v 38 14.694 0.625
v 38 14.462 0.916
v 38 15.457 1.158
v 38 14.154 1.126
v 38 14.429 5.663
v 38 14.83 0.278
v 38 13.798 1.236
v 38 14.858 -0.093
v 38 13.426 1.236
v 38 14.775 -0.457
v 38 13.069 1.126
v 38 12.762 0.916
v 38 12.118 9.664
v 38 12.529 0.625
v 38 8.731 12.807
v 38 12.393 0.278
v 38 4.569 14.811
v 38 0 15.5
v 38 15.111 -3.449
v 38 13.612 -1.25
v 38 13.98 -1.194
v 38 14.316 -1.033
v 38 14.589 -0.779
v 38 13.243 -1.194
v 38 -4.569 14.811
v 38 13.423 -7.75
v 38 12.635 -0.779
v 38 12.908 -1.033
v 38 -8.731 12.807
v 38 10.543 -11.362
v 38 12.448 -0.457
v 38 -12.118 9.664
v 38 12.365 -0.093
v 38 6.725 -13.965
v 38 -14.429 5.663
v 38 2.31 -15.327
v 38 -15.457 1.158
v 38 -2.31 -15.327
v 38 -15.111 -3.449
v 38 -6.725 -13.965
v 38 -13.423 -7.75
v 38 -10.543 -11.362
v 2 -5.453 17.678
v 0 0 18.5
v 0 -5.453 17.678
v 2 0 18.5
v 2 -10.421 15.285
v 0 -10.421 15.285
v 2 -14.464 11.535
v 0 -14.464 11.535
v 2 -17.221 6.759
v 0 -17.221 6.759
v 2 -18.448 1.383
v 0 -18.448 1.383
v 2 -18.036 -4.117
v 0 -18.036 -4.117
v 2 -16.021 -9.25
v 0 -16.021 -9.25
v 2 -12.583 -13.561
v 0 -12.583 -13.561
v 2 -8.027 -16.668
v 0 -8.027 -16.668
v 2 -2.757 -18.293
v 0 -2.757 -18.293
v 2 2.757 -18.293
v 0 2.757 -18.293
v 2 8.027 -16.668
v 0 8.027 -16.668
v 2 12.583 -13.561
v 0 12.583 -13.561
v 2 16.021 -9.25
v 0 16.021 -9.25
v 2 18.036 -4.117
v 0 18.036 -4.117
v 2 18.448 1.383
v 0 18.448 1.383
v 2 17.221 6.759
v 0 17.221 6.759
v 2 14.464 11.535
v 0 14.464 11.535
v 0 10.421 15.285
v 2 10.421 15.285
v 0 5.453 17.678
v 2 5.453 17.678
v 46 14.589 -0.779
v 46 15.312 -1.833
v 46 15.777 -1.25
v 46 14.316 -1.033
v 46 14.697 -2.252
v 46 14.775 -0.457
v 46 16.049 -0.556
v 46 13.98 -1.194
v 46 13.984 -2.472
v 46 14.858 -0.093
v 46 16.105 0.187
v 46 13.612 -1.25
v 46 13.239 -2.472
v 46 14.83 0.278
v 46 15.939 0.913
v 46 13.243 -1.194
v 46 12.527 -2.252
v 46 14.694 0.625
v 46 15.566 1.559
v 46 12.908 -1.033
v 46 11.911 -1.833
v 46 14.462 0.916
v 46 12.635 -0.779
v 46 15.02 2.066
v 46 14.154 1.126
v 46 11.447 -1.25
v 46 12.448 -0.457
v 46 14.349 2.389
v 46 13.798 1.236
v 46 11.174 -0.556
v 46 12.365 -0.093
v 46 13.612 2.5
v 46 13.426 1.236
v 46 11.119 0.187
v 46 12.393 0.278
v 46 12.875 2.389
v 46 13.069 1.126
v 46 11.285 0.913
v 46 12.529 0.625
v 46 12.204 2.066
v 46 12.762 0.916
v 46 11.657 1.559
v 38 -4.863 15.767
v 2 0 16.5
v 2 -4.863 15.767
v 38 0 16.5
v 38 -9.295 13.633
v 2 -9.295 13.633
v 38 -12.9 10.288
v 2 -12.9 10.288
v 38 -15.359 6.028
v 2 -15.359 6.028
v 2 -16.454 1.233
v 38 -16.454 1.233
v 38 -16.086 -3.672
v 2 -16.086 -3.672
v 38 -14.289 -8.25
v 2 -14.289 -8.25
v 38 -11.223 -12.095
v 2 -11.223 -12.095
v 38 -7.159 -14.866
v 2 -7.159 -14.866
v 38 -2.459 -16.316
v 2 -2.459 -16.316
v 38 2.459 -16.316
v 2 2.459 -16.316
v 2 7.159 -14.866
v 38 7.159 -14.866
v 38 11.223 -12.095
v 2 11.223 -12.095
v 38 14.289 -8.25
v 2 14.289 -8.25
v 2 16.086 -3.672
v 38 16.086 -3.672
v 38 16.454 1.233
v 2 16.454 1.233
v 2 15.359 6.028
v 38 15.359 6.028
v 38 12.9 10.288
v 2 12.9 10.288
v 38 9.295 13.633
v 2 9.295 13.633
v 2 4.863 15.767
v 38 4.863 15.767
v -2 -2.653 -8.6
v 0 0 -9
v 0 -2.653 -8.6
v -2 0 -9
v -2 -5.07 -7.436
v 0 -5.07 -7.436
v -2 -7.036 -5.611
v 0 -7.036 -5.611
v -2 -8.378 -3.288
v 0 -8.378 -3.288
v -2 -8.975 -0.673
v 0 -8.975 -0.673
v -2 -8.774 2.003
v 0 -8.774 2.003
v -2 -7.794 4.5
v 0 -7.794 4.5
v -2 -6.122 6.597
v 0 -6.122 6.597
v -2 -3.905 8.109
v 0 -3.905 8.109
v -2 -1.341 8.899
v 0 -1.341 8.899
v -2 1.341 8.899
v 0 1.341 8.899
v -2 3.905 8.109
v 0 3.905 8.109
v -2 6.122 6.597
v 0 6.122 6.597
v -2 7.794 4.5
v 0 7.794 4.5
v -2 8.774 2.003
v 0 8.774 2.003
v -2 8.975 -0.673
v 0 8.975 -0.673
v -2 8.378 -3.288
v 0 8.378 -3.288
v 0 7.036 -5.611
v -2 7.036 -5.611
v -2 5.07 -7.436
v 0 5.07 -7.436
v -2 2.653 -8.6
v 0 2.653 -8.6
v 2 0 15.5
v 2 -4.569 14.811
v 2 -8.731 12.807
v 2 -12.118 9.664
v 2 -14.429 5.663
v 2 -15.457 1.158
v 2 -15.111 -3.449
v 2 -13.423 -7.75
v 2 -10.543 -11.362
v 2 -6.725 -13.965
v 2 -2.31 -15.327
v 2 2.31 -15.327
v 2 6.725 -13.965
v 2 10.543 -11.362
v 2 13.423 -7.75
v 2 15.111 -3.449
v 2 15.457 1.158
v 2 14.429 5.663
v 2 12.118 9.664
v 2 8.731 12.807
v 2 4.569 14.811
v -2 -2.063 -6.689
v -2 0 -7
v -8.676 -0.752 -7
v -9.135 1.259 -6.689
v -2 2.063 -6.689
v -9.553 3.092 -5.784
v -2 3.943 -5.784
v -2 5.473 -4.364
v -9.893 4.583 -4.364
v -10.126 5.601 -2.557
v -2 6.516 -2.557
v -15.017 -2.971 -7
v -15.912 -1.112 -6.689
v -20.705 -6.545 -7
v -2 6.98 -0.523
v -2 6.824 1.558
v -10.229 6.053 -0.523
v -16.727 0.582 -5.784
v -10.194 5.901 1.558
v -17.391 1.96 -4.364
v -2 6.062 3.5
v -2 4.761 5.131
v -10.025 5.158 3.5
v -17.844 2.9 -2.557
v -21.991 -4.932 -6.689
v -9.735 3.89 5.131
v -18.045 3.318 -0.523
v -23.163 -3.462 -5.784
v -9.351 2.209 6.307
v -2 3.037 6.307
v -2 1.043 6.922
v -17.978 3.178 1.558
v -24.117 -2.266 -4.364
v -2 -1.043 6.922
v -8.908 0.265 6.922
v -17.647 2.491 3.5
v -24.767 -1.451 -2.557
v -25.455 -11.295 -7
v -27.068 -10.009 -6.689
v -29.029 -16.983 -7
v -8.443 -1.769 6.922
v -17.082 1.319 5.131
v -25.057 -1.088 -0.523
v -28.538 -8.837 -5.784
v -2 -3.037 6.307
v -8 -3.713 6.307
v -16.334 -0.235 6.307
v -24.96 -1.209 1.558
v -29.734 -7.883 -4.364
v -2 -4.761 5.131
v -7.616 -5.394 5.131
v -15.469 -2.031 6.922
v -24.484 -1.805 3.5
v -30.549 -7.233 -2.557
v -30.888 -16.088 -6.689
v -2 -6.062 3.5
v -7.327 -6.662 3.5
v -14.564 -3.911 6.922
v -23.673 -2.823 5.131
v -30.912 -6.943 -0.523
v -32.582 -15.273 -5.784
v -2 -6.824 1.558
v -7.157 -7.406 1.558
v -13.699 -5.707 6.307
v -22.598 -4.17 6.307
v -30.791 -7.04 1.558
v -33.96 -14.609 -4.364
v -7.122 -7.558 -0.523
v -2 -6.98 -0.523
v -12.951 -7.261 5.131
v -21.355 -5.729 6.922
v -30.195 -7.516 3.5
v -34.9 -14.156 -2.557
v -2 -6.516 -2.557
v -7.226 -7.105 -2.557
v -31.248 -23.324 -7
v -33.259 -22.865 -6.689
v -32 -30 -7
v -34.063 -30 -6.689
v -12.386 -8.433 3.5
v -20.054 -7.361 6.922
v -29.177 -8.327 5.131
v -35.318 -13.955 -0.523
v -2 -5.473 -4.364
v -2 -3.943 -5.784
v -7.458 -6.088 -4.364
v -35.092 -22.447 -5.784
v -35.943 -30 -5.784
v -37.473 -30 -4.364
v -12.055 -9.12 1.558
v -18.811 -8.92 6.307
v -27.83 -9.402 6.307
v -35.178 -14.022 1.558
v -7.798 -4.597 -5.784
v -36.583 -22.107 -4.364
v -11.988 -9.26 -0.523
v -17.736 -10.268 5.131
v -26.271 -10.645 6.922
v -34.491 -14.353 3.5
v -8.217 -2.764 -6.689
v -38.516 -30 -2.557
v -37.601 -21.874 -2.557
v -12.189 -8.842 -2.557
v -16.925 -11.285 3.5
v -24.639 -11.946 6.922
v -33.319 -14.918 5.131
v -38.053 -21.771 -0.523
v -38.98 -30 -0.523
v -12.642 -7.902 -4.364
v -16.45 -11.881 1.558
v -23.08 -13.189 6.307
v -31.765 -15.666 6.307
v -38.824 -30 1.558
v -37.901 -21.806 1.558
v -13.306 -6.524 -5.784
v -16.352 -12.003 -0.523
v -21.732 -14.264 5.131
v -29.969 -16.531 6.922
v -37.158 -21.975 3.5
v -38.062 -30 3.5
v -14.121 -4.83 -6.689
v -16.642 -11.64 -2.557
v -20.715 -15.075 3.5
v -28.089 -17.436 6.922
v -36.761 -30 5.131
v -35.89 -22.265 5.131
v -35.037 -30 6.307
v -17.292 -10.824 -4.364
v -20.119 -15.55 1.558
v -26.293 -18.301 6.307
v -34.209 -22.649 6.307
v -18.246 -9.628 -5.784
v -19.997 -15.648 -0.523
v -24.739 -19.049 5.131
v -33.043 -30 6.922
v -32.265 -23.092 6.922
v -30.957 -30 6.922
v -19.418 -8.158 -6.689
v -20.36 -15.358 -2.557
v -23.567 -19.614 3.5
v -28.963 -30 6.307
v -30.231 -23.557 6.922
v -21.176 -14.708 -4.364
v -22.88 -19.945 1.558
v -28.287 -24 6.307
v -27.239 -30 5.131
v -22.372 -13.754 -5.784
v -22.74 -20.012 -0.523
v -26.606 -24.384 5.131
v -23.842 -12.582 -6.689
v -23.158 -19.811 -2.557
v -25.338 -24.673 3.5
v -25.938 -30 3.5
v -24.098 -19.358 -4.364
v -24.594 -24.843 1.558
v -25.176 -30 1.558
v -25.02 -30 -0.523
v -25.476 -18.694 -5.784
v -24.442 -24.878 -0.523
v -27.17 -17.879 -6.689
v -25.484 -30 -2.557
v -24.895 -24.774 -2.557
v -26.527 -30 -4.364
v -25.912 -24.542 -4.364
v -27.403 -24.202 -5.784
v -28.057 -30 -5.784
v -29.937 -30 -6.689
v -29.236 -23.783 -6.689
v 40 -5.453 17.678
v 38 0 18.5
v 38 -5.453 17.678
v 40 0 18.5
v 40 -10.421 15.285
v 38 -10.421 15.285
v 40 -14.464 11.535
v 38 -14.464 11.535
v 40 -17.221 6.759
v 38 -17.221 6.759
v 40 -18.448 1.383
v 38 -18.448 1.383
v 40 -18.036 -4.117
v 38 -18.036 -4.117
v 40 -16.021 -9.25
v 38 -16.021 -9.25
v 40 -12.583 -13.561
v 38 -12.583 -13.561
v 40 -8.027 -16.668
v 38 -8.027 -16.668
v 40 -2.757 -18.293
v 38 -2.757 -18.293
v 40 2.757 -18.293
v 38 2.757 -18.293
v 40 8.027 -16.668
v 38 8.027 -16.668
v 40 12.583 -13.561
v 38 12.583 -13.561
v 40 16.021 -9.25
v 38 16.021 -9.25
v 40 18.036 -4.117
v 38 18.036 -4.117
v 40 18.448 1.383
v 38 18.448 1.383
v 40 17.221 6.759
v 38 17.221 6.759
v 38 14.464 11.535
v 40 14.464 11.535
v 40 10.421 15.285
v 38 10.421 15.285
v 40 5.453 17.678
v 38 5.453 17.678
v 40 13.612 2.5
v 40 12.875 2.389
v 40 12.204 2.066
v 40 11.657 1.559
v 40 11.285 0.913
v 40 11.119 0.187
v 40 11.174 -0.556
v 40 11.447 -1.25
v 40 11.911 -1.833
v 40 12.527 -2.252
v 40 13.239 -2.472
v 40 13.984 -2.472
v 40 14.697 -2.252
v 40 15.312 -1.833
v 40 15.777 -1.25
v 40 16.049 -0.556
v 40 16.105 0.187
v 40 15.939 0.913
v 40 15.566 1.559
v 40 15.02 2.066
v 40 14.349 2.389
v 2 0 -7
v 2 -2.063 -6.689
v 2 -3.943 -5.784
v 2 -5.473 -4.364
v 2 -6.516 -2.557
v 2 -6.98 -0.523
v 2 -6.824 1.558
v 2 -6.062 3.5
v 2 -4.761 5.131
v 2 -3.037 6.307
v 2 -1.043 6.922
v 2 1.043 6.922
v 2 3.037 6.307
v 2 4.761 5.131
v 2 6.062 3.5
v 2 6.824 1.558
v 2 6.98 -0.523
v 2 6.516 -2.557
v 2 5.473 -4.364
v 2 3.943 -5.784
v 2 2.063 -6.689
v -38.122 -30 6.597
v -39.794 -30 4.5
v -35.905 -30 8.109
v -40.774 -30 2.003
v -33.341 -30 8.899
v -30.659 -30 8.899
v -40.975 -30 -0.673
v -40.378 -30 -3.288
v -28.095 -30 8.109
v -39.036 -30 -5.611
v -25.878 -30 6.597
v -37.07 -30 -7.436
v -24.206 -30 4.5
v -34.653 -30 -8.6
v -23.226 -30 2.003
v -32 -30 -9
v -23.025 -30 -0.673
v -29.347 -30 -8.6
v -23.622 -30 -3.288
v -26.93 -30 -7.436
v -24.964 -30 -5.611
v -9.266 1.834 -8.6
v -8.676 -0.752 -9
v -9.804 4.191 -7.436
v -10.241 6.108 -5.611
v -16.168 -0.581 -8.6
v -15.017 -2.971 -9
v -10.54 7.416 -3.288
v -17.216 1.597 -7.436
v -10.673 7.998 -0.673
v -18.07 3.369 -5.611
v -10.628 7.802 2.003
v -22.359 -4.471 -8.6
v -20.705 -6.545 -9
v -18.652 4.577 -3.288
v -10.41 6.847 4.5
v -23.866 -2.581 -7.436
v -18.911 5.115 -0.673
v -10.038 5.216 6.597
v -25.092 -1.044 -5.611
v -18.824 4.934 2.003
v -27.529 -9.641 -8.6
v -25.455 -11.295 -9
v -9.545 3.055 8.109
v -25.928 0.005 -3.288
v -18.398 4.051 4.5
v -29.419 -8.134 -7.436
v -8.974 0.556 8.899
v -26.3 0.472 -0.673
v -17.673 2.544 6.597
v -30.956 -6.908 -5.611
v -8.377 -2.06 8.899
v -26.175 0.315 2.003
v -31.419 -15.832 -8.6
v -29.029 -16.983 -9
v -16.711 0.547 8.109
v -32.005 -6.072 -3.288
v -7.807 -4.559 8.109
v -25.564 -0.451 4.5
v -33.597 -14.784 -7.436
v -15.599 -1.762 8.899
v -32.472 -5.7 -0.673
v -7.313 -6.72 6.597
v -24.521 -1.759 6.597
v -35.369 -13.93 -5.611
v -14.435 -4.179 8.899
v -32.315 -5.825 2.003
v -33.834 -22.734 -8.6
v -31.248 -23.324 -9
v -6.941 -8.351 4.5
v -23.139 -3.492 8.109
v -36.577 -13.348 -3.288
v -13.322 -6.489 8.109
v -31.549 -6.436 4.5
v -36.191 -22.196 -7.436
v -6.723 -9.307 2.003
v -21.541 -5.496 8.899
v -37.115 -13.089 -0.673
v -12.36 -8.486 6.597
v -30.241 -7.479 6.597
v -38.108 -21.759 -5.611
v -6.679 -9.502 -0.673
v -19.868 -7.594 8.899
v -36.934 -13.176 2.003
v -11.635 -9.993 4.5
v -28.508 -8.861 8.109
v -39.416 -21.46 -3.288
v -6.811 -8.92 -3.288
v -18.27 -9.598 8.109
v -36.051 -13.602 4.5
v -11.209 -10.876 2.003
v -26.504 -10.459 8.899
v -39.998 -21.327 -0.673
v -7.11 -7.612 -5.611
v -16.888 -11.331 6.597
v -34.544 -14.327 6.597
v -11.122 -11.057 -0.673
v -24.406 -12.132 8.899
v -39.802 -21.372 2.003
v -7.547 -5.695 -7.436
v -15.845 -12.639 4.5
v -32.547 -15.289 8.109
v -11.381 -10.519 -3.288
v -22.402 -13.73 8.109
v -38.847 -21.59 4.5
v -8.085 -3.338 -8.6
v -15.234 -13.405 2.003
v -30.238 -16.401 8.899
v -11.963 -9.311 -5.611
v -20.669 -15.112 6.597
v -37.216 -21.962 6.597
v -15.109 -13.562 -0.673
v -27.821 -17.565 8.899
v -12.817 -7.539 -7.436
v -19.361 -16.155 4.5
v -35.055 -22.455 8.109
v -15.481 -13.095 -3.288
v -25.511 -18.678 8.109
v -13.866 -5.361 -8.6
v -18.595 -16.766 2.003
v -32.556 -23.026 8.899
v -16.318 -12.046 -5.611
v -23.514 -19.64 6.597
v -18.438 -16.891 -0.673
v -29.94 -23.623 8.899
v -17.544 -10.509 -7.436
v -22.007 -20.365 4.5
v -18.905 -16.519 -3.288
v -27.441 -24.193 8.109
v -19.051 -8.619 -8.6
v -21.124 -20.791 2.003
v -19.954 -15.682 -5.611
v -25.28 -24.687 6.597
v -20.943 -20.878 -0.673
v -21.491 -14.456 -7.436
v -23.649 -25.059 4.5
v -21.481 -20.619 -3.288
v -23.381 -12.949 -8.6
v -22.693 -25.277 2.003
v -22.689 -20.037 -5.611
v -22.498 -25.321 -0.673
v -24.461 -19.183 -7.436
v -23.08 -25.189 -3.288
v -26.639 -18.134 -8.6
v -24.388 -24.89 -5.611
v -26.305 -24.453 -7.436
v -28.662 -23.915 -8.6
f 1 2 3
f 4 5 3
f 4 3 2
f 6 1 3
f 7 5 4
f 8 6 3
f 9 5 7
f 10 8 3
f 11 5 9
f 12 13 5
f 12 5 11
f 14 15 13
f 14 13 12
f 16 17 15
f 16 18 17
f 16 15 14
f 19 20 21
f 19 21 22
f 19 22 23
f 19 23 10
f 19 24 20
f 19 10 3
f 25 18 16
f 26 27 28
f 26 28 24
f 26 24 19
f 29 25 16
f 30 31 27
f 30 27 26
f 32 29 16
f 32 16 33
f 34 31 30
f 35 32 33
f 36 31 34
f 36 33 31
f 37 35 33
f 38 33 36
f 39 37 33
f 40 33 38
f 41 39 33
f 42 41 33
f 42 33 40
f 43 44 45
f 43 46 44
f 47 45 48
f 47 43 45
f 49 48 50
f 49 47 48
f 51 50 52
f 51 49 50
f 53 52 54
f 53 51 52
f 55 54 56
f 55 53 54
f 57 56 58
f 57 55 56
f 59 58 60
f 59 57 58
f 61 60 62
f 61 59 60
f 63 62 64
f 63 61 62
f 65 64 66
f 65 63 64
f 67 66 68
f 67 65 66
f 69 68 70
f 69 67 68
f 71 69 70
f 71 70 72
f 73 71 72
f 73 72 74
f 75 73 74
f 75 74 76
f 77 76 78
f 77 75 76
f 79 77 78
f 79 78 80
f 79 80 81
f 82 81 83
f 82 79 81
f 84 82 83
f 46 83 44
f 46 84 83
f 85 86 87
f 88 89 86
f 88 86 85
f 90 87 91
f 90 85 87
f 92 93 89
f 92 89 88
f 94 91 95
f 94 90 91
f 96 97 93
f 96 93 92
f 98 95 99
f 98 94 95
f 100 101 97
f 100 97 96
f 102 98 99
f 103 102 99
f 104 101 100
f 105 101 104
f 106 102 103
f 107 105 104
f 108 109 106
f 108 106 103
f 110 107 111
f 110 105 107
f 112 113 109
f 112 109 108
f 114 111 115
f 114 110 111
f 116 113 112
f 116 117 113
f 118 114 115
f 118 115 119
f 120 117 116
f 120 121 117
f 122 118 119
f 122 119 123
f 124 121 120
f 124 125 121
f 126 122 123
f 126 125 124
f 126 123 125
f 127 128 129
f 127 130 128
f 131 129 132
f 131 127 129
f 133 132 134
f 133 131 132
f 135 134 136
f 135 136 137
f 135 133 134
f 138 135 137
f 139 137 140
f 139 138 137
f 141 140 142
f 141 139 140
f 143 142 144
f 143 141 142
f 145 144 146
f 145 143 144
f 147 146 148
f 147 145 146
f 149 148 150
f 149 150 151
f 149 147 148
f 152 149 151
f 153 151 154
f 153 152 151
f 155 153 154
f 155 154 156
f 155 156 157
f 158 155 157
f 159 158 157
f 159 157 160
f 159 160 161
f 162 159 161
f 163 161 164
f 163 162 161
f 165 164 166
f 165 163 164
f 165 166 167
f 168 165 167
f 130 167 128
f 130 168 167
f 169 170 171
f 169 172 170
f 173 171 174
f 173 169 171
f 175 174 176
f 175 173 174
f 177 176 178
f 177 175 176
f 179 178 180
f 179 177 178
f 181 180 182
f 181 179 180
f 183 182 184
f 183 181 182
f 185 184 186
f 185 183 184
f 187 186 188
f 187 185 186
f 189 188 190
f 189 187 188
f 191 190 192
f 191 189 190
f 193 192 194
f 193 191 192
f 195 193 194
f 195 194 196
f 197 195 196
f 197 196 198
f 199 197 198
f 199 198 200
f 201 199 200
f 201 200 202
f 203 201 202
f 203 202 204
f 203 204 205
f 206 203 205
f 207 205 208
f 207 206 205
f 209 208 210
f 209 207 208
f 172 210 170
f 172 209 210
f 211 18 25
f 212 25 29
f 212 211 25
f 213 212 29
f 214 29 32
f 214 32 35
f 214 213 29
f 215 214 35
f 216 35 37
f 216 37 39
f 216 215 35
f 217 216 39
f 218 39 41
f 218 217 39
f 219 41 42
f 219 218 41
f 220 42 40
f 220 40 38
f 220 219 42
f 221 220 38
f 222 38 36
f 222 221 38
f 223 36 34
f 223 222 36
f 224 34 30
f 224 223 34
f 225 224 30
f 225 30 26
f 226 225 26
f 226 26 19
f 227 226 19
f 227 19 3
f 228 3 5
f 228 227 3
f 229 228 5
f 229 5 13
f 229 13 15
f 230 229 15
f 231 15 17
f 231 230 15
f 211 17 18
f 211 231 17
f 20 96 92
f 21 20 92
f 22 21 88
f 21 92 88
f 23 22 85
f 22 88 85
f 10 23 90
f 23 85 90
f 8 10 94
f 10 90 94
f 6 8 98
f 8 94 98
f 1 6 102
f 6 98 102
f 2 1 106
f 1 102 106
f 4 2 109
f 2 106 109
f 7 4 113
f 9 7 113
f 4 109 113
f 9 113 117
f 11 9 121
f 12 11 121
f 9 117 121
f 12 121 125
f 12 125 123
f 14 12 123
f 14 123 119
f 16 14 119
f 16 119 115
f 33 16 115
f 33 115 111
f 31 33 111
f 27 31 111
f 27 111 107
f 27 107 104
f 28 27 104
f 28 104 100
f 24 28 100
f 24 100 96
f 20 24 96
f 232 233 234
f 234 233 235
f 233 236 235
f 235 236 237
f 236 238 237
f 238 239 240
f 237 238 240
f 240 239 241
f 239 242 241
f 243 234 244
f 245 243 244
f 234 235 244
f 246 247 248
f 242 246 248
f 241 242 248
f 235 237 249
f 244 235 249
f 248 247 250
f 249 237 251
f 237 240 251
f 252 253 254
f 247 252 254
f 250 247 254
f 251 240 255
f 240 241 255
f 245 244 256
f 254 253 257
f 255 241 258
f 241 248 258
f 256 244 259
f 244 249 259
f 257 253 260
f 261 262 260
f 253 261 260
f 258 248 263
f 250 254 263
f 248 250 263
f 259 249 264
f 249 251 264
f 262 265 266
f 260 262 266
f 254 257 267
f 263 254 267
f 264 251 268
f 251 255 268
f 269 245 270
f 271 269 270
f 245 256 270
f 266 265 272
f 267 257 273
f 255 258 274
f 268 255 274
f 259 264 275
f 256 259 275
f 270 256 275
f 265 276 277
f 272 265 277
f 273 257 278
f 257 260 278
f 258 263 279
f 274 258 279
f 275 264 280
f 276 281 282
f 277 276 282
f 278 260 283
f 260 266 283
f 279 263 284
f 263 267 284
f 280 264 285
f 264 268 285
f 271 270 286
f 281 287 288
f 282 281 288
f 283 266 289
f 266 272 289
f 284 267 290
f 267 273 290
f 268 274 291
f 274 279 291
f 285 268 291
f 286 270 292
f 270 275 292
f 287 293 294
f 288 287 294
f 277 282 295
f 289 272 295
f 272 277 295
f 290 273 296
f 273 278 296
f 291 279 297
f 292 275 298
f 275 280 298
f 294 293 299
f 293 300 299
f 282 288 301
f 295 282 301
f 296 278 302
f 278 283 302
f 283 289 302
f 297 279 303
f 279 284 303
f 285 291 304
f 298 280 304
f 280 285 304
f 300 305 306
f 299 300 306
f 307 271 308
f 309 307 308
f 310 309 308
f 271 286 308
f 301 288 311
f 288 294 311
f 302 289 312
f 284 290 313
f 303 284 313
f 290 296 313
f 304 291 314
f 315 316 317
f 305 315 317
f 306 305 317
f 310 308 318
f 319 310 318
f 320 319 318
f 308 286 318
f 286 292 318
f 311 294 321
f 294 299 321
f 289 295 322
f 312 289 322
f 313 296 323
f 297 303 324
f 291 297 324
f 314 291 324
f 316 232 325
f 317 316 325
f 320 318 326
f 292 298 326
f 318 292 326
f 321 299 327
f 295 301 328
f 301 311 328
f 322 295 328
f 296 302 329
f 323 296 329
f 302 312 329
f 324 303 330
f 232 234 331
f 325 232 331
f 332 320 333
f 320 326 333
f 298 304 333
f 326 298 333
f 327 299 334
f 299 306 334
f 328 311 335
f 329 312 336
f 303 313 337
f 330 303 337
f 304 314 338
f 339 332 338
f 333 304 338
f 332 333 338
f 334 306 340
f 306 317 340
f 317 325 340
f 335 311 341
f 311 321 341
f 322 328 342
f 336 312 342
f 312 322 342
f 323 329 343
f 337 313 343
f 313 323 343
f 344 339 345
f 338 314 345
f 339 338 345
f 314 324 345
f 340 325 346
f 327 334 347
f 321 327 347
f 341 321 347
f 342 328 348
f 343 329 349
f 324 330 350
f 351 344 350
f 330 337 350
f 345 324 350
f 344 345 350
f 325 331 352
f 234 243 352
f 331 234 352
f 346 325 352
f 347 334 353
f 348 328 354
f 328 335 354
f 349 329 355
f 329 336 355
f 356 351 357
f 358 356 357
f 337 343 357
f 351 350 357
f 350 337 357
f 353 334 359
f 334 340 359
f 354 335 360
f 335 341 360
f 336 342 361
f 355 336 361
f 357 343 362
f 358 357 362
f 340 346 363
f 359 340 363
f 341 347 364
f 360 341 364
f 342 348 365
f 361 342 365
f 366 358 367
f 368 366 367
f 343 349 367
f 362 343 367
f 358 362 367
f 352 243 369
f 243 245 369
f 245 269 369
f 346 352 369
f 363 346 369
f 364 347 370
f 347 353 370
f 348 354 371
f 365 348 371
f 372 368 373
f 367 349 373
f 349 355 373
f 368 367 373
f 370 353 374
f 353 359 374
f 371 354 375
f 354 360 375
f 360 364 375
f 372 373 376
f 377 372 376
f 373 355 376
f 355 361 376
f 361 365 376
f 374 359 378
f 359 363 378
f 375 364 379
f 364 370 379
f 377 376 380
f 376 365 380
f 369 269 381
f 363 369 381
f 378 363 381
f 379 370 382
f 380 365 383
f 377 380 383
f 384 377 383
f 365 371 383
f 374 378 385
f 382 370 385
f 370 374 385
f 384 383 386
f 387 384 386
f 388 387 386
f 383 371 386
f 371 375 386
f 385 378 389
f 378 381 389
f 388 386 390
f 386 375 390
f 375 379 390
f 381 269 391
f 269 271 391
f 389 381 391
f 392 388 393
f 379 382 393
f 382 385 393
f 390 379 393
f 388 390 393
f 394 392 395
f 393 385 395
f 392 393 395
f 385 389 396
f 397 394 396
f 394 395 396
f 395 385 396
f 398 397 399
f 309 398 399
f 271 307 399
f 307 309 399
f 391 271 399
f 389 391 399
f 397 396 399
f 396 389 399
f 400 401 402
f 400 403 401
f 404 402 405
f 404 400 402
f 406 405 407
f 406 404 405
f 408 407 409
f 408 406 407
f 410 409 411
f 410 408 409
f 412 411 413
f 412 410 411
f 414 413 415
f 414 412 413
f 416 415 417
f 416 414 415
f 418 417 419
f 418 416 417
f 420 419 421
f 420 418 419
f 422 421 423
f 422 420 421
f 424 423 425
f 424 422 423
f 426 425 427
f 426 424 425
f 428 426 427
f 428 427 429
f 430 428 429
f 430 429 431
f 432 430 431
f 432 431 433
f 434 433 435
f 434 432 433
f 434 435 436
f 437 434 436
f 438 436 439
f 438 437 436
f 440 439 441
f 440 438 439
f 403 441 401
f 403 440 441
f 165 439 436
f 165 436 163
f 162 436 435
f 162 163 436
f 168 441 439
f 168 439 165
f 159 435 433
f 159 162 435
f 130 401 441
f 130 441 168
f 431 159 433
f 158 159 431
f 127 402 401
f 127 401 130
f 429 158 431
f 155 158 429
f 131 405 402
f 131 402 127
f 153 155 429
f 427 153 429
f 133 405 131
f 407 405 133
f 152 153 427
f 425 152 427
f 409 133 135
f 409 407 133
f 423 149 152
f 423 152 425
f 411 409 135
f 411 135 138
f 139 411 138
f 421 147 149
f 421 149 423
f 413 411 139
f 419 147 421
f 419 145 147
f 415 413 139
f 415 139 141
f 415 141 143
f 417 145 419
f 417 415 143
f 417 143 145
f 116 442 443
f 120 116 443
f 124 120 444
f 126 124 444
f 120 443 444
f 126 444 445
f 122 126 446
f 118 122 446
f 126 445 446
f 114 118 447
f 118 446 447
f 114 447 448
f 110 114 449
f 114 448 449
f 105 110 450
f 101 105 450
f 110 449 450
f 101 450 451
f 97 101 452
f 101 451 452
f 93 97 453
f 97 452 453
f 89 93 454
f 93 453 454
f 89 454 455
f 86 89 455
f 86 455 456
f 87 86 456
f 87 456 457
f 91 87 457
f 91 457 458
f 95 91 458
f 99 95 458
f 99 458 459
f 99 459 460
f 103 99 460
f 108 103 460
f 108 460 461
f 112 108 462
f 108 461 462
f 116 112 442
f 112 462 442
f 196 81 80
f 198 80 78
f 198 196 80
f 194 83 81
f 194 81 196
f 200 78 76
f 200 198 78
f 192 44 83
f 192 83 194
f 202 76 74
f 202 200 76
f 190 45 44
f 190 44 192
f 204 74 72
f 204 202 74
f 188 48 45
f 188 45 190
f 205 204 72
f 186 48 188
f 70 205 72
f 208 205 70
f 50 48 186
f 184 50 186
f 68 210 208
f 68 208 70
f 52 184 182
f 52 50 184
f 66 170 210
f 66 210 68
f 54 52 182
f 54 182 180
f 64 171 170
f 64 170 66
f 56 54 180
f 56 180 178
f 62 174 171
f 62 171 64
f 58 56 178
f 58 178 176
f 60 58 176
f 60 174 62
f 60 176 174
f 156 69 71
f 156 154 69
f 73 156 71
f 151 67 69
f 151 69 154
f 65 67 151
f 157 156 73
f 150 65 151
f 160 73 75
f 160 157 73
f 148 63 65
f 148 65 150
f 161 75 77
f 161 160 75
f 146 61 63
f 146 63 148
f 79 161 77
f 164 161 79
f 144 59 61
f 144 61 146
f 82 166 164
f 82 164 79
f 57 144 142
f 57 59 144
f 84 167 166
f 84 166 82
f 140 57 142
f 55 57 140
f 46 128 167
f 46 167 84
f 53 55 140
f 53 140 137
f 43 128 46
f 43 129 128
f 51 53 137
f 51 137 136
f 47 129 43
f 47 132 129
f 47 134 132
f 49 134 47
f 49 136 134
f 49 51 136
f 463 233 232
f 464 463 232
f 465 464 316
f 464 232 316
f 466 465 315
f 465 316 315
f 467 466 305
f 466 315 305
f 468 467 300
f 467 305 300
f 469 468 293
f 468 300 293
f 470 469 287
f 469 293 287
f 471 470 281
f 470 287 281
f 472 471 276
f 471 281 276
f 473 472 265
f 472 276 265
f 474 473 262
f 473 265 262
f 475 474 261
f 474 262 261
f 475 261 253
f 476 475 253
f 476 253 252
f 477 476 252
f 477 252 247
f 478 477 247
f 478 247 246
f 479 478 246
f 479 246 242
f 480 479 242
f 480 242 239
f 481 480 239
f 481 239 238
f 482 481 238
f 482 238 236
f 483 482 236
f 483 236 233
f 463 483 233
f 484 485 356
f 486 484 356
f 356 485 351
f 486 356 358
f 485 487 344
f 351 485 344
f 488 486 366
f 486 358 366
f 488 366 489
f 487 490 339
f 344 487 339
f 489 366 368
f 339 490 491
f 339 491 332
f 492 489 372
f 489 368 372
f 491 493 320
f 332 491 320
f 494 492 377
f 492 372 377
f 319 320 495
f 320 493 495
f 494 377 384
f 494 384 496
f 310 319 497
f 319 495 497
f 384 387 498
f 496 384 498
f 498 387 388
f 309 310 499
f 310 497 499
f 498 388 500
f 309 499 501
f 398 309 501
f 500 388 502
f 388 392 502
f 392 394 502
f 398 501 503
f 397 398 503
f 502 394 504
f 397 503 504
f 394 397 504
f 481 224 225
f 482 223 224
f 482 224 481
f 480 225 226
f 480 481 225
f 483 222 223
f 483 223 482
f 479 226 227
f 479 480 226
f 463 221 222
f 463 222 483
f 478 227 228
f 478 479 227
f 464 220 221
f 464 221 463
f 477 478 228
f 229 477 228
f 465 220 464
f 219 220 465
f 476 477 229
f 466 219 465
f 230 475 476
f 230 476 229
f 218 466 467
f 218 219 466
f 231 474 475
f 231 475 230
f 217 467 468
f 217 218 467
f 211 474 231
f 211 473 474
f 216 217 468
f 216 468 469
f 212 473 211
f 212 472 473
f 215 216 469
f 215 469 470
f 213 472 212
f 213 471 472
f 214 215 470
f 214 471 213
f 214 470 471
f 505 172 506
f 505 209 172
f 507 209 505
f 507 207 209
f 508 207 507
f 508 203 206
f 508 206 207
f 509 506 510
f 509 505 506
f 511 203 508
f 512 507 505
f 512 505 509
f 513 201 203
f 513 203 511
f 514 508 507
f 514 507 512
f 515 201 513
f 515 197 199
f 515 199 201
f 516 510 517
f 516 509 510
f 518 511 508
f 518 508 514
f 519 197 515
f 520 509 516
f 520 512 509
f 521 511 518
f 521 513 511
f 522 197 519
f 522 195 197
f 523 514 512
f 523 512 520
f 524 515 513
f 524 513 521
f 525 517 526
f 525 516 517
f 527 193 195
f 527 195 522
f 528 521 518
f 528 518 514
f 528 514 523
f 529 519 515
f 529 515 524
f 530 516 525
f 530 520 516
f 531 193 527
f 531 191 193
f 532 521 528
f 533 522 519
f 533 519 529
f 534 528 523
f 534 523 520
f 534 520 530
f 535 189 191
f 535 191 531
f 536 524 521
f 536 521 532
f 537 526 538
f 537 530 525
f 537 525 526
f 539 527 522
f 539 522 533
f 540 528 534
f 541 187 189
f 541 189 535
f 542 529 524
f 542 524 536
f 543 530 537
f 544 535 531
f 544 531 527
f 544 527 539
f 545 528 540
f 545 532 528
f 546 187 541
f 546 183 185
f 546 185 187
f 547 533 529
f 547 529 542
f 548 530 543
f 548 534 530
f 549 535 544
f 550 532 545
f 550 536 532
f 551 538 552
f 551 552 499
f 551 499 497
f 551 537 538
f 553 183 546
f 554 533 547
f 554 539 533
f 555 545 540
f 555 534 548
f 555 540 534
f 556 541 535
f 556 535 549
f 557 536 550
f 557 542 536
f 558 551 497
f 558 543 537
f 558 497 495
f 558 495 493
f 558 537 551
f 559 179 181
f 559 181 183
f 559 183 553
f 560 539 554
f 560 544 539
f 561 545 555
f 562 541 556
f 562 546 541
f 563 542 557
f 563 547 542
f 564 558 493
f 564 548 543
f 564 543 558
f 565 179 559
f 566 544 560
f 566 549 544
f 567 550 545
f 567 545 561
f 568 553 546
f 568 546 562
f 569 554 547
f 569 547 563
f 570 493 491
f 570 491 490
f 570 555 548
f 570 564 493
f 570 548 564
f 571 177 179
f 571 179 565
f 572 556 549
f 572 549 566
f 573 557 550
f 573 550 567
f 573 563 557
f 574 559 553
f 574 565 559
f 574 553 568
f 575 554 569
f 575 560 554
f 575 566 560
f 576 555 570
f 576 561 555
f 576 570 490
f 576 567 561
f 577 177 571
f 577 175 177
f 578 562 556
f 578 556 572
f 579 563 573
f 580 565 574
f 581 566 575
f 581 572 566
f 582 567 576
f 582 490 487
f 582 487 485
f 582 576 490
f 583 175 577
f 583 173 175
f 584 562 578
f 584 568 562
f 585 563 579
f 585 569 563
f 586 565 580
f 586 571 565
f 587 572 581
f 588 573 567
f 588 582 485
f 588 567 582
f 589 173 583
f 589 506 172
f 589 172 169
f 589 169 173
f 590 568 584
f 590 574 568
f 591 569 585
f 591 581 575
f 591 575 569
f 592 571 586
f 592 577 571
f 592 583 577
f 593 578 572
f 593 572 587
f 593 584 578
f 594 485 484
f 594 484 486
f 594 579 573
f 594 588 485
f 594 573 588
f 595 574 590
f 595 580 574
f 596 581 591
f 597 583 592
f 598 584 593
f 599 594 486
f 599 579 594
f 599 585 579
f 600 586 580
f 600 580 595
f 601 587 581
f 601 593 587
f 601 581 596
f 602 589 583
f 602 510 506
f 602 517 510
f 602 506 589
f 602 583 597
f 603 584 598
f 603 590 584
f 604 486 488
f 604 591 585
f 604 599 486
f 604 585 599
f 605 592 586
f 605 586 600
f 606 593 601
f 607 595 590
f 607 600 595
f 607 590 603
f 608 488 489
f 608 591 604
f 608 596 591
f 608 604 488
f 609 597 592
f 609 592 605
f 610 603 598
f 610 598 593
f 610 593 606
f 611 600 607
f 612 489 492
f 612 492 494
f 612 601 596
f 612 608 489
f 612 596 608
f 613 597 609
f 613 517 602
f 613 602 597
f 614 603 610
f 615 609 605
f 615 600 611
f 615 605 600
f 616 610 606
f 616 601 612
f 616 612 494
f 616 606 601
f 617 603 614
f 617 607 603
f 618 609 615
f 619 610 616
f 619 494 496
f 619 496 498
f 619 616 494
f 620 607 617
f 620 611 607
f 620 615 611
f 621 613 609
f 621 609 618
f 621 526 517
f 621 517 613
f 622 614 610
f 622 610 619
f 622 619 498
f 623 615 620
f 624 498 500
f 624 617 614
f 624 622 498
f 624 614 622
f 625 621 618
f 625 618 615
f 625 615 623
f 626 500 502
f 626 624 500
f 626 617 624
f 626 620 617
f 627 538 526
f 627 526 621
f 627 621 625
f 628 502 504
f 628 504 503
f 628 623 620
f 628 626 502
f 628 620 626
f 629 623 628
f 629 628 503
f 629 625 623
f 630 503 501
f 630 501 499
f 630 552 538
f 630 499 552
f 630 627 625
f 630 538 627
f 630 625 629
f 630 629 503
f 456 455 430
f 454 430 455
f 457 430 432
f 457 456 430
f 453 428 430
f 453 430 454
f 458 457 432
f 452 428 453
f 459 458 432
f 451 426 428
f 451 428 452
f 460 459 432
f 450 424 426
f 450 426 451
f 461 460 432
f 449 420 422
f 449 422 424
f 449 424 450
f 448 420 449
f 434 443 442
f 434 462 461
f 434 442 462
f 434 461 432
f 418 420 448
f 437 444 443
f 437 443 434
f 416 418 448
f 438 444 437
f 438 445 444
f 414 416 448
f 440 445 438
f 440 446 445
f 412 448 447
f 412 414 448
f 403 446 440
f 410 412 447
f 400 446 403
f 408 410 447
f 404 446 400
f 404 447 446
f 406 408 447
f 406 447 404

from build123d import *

# Parameters (mm, degrees)
ESQUISSE2_R             = 2.5
BOSS_EXTRU_1_DEPTH      = 6
ESQUISSE3_R             = 1.25
ENL_V_MAT_EXTRU_1_DEPTH = 14.3
ESQUISSE4_R             = 9
ENL_V_MAT_EXTRU_2_DEPTH = 5
ESQUISSE6_R             = 9
ESQUISSE6_R_2           = 7


with BuildPart() as part:
    # Esquisse1 → Base-Révolution (revolve)
    with BuildSketch(Plane.XY, mode=Mode.PRIVATE) as base_r_volution_sk:
        Polygon((2, 16.5), (38, 16.5), (38, 18.5), (40, 18.5), (40, 0), (38, 0), (38, 15.5), (2, 15.5), (2, 0), (0, 0), (0, 18.5), (2, 18.5), align=None)
    revolve(base_r_volution_sk.sketch.rotate(Axis((-25.081544634, 0, 0), (1, 0, 0)), 90), axis=Axis((-25.081544634, 0, 0), (1, 0, 0)))

    # Esquisse2 → Boss.-Extru.1 (add)
    with BuildSketch(Plane(origin=(40, 0, 0), x_dir=(0, 0, -1), z_dir=(1, 0, 0))):
        with Locations(Location((0, 13.61181584, 0), (0, 0, 180))):
            Circle(ESQUISSE2_R)
    extrude(amount=BOSS_EXTRU_1_DEPTH)

    # Esquisse3 → Enlèv. mat.-Extru.1 (cut)
    with BuildSketch(Plane(origin=(46, 0, 0), x_dir=(0, 0, -1), z_dir=(1, 0, 0))):
        with Locations((0, 13.61181584)):
            Circle(ESQUISSE3_R)
    extrude(amount=-ENL_V_MAT_EXTRU_1_DEPTH, mode=Mode.SUBTRACT)

    # Esquisse4 → Enlèv. mat.-Extru.2 (cut)
    with BuildSketch(Plane.ZY):
        Circle(ESQUISSE4_R)
    extrude(amount=-ENL_V_MAT_EXTRU_2_DEPTH, mode=Mode.SUBTRACT)

    # Boss.-Balayage1: sweep along a path in Esquisse7
    with BuildLine(Plane.XY) as boss_balayage1_path:
        Line((2, 0), (-2, 0))
        ThreePointArc((-2, 0), (-23.213203436, -8.786796564), (-32, -30))
    # Esquisse6 → Boss.-Balayage1 (sweep)
    with BuildSketch(Plane(origin=(2, 0, 0), x_dir=(0, 0, -1), z_dir=(1, 0, 0))):
        Circle(ESQUISSE6_R)
        Circle(ESQUISSE6_R_2, mode=Mode.SUBTRACT)
    sweep(path=boss_balayage1_path.line)


solid = part.part
